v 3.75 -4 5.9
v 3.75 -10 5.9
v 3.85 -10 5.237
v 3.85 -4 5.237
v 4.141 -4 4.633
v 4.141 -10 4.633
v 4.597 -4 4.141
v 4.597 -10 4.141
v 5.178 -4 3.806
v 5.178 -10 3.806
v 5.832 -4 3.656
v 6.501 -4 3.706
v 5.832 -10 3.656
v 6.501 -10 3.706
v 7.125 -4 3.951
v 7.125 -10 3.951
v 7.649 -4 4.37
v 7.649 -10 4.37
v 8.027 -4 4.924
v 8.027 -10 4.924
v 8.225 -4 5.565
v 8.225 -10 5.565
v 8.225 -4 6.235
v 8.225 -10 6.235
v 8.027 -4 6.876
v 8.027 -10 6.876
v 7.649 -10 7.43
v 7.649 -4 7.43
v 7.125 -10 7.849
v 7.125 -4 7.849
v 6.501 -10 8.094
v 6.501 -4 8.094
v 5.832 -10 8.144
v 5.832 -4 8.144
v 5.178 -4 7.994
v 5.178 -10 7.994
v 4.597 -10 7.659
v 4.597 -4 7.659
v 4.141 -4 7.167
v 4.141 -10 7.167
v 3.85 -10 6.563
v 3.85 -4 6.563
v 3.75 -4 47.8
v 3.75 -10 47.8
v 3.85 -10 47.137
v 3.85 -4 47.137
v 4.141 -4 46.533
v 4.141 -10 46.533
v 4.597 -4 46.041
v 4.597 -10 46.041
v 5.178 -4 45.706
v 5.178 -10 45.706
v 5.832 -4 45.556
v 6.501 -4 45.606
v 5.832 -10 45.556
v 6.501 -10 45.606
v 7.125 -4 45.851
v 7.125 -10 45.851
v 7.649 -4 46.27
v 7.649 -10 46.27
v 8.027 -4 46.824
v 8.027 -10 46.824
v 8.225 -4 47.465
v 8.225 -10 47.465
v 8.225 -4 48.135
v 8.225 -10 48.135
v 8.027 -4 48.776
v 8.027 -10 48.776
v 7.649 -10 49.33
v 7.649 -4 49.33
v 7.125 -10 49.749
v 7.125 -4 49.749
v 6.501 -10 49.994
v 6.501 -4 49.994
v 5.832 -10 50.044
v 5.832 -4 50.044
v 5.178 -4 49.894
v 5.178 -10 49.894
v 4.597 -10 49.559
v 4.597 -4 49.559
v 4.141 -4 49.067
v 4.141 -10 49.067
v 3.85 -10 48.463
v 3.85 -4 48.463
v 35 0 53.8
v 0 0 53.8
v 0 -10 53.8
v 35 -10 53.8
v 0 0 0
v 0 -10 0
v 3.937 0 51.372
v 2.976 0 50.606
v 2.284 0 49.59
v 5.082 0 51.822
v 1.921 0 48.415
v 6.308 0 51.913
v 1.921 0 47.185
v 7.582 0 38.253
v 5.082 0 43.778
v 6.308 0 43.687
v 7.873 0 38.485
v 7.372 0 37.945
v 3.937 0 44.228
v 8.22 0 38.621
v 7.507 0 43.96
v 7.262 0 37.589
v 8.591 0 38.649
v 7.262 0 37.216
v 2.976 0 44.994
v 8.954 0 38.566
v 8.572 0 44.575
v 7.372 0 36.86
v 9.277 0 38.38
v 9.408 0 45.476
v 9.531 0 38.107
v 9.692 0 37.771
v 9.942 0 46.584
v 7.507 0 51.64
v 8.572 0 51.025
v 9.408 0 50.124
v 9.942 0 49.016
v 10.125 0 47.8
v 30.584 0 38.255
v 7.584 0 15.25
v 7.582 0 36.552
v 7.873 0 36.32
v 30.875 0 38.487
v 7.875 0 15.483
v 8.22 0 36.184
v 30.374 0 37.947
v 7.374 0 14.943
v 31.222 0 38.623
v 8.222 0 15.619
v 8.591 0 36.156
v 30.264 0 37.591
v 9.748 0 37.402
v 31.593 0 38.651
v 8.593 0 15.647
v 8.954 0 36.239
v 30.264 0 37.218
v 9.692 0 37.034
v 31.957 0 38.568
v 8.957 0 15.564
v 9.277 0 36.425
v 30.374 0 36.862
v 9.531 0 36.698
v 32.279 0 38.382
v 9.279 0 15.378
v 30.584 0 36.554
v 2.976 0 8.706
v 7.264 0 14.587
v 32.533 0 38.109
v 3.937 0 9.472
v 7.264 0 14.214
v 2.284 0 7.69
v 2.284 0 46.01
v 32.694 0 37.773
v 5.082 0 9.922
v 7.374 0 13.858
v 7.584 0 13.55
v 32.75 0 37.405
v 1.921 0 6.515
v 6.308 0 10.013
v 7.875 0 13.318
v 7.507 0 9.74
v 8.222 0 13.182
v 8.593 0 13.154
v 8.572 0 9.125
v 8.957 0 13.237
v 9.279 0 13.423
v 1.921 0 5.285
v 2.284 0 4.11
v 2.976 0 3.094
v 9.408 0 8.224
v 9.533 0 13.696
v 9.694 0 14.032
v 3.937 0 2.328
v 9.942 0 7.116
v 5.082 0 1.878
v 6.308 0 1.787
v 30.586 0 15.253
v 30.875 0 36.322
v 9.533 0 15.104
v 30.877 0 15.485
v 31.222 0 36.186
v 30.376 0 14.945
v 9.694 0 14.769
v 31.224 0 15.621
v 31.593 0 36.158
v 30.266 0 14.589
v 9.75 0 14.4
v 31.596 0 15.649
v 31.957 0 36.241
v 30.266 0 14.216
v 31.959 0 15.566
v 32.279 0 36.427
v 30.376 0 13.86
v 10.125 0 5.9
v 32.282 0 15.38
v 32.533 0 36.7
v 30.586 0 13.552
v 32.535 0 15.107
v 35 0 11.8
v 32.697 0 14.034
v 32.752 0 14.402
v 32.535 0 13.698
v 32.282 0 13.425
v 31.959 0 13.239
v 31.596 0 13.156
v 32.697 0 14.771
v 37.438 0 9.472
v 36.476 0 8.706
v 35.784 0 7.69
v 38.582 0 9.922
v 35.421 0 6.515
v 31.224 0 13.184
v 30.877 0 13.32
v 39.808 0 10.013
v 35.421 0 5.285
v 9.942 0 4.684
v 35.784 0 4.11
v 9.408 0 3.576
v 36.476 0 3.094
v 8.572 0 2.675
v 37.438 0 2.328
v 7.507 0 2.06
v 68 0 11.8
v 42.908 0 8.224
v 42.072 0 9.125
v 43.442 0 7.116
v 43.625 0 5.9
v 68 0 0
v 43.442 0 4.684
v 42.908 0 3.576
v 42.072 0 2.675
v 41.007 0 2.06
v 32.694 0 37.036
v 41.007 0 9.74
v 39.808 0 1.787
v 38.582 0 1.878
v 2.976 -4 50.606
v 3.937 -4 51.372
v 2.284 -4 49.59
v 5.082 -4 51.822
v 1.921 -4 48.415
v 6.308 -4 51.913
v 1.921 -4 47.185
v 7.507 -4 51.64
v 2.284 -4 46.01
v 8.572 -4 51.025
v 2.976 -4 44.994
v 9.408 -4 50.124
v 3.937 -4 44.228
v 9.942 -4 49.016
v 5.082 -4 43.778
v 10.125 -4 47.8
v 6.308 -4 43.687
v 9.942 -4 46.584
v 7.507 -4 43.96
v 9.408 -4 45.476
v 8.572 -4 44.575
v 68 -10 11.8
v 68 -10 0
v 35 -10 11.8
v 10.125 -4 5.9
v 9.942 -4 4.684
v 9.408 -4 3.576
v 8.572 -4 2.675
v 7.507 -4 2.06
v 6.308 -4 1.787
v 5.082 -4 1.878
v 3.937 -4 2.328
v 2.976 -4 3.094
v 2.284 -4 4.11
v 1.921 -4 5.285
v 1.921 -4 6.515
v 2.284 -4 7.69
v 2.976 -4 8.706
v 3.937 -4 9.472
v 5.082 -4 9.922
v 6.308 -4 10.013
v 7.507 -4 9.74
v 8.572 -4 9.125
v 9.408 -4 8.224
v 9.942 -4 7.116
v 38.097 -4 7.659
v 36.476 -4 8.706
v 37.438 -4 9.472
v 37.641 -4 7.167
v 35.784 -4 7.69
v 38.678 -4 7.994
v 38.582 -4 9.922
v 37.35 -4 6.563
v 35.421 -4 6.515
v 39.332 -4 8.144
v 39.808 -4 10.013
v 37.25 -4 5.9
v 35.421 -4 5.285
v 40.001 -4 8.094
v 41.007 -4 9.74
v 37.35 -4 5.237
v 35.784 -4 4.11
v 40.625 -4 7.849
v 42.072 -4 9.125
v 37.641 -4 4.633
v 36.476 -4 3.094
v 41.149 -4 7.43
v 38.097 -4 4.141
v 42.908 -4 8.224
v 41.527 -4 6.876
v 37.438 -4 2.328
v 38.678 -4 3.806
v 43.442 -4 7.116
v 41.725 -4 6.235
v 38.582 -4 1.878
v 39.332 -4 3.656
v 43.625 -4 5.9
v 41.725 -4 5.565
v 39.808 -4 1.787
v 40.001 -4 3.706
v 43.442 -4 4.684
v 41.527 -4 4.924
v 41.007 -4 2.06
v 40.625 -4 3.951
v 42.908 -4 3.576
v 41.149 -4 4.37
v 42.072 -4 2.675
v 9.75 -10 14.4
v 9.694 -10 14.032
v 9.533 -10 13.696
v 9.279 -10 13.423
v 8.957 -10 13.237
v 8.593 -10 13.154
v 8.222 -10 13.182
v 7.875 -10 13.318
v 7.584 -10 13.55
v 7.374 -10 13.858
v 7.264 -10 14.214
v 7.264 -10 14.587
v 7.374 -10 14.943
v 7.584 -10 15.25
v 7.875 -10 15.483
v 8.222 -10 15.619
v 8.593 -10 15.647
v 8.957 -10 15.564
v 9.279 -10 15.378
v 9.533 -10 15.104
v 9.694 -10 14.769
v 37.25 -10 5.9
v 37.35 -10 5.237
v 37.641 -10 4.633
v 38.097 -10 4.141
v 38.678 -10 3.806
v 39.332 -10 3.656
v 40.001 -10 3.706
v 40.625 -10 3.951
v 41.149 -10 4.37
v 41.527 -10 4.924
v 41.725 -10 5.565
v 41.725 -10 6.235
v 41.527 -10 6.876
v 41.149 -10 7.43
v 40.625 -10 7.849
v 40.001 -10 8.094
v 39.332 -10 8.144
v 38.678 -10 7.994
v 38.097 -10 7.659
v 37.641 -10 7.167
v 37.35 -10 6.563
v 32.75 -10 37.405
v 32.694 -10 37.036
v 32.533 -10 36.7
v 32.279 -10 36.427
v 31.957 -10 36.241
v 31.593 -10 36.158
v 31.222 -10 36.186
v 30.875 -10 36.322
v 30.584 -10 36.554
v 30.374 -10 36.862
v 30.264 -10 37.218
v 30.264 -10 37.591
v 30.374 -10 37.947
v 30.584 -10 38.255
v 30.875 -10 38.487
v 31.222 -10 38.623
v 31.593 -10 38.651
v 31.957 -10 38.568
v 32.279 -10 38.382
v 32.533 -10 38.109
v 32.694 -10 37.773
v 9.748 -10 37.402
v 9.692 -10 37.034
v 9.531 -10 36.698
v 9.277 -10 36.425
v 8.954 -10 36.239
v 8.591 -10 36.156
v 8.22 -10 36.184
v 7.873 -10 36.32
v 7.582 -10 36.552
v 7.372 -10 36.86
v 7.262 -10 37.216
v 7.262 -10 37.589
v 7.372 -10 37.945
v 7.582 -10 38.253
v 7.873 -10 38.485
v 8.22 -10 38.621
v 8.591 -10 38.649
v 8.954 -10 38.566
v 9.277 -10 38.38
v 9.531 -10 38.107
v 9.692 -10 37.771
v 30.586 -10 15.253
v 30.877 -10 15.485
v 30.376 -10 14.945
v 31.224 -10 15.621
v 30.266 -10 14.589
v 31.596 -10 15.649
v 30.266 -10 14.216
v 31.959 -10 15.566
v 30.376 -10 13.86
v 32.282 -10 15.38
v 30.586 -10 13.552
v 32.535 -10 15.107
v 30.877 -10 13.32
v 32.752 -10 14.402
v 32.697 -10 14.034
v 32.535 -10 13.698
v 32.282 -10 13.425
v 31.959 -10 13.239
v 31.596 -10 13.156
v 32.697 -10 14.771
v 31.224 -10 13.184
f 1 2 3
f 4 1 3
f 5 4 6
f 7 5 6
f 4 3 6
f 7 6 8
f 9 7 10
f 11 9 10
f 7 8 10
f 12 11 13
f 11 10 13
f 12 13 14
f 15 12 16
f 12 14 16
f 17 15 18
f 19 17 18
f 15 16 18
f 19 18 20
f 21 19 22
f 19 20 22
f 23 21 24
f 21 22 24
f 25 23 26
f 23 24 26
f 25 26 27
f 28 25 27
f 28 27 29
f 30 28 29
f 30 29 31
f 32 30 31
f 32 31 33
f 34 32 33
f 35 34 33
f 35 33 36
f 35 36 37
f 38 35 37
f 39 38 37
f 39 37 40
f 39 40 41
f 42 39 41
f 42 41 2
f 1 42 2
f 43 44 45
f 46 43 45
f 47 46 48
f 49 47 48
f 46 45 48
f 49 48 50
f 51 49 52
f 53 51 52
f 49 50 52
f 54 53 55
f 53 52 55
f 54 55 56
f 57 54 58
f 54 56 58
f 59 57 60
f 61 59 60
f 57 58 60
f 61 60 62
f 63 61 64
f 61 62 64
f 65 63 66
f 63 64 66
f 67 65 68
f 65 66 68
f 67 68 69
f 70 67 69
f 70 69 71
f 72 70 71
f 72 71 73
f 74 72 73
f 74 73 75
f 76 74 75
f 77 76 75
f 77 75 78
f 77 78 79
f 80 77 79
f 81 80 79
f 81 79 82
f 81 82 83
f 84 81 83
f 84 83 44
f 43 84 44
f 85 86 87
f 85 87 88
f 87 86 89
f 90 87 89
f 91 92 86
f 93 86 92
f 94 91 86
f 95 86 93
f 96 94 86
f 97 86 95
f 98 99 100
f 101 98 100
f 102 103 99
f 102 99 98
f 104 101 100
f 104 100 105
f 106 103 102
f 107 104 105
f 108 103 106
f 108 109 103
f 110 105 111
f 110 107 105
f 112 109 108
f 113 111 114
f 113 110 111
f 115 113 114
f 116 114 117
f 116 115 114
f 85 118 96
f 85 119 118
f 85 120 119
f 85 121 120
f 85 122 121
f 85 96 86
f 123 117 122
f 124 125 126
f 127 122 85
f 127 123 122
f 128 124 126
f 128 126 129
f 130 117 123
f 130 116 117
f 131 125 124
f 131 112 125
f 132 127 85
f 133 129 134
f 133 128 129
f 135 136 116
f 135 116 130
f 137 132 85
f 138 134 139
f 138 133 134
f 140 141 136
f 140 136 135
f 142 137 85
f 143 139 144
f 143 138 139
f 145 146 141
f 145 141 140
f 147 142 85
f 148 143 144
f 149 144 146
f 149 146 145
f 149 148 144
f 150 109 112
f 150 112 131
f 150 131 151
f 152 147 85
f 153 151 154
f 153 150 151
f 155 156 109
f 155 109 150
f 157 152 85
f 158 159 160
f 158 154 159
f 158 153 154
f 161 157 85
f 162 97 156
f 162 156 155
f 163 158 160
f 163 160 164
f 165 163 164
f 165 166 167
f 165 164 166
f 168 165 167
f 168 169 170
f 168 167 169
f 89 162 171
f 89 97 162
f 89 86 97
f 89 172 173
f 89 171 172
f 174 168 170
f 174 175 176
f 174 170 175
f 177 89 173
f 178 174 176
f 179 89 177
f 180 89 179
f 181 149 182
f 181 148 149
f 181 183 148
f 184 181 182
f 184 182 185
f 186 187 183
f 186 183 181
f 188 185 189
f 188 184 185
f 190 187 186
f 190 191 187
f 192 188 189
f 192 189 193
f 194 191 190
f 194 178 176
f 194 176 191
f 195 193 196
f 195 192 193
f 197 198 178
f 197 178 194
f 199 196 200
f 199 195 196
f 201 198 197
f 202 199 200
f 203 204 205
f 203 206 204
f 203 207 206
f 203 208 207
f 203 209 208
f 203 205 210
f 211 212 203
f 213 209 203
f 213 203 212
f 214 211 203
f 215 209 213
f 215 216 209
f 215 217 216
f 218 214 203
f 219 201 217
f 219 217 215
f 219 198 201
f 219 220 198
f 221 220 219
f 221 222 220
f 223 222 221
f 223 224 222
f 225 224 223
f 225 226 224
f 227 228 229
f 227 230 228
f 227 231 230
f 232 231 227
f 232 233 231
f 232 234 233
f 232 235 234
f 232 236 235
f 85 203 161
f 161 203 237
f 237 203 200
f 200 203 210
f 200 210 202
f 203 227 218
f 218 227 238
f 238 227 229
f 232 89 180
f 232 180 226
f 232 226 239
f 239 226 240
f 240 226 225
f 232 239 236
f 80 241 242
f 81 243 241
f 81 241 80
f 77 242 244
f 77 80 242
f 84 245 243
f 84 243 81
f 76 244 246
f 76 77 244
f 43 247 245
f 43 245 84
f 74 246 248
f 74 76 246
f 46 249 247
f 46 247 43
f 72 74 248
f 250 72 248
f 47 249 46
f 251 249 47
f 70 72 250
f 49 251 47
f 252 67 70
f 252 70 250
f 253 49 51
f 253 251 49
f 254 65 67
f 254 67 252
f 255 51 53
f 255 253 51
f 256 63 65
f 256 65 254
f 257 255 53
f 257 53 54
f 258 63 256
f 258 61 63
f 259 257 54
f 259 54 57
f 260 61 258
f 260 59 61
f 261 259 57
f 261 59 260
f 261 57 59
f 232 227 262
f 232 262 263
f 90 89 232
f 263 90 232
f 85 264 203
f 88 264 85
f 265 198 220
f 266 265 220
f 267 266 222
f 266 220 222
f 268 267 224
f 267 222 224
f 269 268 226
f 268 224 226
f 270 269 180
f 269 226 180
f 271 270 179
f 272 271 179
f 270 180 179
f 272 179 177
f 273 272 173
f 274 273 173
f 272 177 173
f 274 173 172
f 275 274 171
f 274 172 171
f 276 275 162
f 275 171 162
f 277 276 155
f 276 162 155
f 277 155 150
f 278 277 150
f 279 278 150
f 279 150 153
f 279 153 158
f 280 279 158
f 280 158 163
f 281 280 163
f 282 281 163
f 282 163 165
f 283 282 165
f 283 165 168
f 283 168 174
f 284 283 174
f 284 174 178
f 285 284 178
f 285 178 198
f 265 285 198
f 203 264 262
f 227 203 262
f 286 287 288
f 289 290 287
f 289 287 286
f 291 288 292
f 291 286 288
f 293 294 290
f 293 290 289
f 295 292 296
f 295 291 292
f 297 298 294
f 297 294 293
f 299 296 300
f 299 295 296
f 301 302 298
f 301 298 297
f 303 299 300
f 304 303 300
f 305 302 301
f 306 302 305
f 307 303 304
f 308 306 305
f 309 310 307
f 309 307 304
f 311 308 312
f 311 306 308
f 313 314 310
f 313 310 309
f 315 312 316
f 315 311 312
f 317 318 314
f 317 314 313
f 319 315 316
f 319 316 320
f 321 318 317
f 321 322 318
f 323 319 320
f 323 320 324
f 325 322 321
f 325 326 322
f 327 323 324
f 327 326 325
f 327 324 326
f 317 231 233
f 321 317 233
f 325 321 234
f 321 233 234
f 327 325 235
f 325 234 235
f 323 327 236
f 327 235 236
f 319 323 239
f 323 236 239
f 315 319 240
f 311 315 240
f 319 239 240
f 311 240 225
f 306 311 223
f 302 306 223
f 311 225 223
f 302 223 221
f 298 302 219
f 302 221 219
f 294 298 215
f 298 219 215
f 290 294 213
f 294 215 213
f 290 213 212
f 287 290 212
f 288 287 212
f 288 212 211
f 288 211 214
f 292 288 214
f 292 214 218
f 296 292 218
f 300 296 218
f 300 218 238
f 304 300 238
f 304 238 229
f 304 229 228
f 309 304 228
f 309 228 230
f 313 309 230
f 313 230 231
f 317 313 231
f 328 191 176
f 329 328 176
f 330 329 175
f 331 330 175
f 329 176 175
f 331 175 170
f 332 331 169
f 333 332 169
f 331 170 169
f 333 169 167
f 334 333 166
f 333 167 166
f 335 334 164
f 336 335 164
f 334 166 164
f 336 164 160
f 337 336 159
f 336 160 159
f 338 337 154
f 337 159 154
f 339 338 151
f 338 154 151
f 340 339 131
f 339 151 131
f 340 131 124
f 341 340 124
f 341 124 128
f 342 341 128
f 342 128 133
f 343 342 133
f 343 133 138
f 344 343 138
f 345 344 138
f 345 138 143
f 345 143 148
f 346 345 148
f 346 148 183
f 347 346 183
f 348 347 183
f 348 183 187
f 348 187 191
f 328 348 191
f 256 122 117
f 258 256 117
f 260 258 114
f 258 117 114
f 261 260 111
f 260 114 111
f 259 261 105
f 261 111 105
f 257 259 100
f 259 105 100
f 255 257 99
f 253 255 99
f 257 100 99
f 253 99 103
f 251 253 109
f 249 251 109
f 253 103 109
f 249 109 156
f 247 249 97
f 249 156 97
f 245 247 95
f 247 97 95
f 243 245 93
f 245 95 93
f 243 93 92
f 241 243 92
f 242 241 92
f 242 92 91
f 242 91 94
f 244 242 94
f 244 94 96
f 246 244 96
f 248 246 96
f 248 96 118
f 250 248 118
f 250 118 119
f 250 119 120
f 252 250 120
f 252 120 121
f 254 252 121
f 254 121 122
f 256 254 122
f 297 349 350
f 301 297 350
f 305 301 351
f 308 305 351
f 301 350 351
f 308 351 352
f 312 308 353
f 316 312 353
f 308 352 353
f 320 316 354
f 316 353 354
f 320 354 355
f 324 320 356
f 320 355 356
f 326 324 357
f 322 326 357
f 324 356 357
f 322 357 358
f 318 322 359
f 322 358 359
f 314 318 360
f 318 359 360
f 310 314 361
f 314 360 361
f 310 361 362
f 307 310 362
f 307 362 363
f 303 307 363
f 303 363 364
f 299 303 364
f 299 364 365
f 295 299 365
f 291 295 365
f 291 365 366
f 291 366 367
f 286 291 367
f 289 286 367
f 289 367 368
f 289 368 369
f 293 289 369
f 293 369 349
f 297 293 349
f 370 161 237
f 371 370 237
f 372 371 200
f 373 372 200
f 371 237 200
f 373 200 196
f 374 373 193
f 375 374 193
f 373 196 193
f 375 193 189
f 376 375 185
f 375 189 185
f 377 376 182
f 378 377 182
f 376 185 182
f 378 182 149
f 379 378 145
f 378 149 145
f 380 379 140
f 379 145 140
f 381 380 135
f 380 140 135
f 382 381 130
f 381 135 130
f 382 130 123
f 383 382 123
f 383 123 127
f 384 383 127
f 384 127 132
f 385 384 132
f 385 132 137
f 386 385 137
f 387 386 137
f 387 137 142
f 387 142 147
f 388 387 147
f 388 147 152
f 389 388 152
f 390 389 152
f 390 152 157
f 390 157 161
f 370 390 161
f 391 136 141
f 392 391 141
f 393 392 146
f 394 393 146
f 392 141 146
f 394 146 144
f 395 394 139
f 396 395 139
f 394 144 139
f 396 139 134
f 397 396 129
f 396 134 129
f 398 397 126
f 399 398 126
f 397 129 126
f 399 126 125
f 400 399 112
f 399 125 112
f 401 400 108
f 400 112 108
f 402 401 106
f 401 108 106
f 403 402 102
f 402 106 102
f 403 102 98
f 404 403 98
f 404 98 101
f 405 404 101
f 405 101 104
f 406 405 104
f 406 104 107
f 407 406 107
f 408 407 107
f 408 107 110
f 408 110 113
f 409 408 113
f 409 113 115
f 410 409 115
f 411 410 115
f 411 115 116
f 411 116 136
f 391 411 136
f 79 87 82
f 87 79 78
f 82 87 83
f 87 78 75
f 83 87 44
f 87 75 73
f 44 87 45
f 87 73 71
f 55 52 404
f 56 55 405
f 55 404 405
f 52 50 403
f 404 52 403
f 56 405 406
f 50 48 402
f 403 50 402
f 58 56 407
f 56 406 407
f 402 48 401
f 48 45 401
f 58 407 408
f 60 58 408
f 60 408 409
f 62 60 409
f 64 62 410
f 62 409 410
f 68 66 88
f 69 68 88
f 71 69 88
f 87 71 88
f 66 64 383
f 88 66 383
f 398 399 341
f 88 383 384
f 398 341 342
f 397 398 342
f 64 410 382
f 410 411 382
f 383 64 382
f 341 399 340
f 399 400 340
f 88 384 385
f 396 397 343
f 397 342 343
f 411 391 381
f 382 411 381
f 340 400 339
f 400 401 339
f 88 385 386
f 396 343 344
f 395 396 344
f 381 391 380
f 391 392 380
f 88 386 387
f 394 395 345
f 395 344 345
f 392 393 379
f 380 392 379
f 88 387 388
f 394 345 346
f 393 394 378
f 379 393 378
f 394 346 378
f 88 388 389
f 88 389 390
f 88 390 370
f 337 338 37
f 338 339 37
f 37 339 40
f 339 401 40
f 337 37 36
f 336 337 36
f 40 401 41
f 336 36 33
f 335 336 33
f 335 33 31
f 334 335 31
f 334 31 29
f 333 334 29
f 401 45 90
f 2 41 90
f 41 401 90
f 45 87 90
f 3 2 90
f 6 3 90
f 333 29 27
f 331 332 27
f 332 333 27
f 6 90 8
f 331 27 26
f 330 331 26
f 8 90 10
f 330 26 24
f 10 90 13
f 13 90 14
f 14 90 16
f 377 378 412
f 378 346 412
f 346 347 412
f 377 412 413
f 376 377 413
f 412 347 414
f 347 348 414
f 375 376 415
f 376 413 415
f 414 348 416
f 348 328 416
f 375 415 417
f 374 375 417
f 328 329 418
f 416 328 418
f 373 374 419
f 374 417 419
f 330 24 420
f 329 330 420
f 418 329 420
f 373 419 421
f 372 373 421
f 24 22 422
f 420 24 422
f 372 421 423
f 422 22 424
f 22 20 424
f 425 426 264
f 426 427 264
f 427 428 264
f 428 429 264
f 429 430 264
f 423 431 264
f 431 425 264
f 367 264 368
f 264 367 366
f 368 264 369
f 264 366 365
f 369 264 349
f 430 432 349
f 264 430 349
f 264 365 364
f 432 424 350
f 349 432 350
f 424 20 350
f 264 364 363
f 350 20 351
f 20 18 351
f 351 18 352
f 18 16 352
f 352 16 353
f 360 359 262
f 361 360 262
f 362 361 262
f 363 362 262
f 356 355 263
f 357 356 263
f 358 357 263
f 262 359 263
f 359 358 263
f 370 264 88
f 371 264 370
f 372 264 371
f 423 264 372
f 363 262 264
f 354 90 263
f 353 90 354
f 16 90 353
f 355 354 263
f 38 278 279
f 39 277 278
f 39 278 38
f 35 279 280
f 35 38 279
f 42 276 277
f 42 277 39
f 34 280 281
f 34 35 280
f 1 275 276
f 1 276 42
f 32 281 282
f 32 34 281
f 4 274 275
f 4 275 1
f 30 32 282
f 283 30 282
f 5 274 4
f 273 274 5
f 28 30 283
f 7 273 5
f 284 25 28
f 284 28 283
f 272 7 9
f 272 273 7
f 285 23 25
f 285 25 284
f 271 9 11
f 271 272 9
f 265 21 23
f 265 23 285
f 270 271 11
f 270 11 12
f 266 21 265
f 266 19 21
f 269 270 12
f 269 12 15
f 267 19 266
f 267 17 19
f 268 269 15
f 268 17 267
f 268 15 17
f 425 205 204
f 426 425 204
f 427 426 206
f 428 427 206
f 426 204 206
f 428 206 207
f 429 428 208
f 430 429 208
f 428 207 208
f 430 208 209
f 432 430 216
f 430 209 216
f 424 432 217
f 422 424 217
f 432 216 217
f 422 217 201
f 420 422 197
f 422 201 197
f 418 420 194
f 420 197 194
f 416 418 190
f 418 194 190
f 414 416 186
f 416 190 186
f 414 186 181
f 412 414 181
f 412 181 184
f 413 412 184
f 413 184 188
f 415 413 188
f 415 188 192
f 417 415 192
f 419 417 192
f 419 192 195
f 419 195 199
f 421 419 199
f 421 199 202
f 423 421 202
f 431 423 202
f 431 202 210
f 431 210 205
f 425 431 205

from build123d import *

# Parameters (mm, degrees)
SKETCH1_W                                           = 68
SKETCH1_H                                           = 53.8
BOSS_EXTRUDE1_DEPTH                                 = 10
SKETCH2_W                                           = 33
SKETCH2_H                                           = 42
CUT_EXTRUDE1_DEPTH                                  = 11
F_2_CLEARANCE_HOLE1_D                               = 2.5
F_2_CLEARANCE_HOLE1_DEPTH                           = 10
CBORE_FOR_8_BINDING_HEAD_MACHINE_SCREW1_D           = 4.5
CBORE_FOR_8_BINDING_HEAD_MACHINE_SCREW1_DEPTH       = 10
CBORE_FOR_8_BINDING_HEAD_MACHINE_SCREW1_CBORE_D     = 8.25
CBORE_FOR_8_BINDING_HEAD_MACHINE_SCREW1_CBORE_DEPTH = 4


with BuildPart() as part:
    # Sketch1 → Boss-Extrude1 (new body)
    with BuildSketch(Plane(origin=(0, 0, 0), x_dir=(1, 0, 0), z_dir=(0, 1, 0))):
        with Locations((34, -26.9)):
            Rectangle(SKETCH1_W, SKETCH1_H)
    extrude(amount=-BOSS_EXTRUDE1_DEPTH)

    # Sketch2 → Cut-Extrude1 (cut, through all)
    with BuildSketch(Plane.XZ.offset(10)):
        with Locations((51.5, 32.8)):
            Rectangle(SKETCH2_W, SKETCH2_H)
    extrude(amount=-CUT_EXTRUDE1_DEPTH, mode=Mode.SUBTRACT)

    # #2 Clearance Hole1
    with Locations(Plane(origin=(0, -10, 0), x_dir=(-1, 0, 0), z_dir=(0, -1, 0))):
        with Locations((-31.502183488, -14.402425), (-31.5, -37.404608488), (-8.497816512, -37.402425), (-8.5, -14.400241512)):
            Hole(F_2_CLEARANCE_HOLE1_D / 2, depth=F_2_CLEARANCE_HOLE1_DEPTH)

    # CBORE for #8 Binding Head Machine Screw1
    with Locations(Plane(origin=(0, 0, 0), x_dir=(1, 0, 0), z_dir=(0, 1, 0))):
        with Locations((6, -47.8), (6, -5.9), (39.5, -5.9)):
            CounterBoreHole(CBORE_FOR_8_BINDING_HEAD_MACHINE_SCREW1_D / 2, CBORE_FOR_8_BINDING_HEAD_MACHINE_SCREW1_CBORE_D / 2, CBORE_FOR_8_BINDING_HEAD_MACHINE_SCREW1_CBORE_DEPTH, depth=CBORE_FOR_8_BINDING_HEAD_MACHINE_SCREW1_DEPTH)


solid = part.part
